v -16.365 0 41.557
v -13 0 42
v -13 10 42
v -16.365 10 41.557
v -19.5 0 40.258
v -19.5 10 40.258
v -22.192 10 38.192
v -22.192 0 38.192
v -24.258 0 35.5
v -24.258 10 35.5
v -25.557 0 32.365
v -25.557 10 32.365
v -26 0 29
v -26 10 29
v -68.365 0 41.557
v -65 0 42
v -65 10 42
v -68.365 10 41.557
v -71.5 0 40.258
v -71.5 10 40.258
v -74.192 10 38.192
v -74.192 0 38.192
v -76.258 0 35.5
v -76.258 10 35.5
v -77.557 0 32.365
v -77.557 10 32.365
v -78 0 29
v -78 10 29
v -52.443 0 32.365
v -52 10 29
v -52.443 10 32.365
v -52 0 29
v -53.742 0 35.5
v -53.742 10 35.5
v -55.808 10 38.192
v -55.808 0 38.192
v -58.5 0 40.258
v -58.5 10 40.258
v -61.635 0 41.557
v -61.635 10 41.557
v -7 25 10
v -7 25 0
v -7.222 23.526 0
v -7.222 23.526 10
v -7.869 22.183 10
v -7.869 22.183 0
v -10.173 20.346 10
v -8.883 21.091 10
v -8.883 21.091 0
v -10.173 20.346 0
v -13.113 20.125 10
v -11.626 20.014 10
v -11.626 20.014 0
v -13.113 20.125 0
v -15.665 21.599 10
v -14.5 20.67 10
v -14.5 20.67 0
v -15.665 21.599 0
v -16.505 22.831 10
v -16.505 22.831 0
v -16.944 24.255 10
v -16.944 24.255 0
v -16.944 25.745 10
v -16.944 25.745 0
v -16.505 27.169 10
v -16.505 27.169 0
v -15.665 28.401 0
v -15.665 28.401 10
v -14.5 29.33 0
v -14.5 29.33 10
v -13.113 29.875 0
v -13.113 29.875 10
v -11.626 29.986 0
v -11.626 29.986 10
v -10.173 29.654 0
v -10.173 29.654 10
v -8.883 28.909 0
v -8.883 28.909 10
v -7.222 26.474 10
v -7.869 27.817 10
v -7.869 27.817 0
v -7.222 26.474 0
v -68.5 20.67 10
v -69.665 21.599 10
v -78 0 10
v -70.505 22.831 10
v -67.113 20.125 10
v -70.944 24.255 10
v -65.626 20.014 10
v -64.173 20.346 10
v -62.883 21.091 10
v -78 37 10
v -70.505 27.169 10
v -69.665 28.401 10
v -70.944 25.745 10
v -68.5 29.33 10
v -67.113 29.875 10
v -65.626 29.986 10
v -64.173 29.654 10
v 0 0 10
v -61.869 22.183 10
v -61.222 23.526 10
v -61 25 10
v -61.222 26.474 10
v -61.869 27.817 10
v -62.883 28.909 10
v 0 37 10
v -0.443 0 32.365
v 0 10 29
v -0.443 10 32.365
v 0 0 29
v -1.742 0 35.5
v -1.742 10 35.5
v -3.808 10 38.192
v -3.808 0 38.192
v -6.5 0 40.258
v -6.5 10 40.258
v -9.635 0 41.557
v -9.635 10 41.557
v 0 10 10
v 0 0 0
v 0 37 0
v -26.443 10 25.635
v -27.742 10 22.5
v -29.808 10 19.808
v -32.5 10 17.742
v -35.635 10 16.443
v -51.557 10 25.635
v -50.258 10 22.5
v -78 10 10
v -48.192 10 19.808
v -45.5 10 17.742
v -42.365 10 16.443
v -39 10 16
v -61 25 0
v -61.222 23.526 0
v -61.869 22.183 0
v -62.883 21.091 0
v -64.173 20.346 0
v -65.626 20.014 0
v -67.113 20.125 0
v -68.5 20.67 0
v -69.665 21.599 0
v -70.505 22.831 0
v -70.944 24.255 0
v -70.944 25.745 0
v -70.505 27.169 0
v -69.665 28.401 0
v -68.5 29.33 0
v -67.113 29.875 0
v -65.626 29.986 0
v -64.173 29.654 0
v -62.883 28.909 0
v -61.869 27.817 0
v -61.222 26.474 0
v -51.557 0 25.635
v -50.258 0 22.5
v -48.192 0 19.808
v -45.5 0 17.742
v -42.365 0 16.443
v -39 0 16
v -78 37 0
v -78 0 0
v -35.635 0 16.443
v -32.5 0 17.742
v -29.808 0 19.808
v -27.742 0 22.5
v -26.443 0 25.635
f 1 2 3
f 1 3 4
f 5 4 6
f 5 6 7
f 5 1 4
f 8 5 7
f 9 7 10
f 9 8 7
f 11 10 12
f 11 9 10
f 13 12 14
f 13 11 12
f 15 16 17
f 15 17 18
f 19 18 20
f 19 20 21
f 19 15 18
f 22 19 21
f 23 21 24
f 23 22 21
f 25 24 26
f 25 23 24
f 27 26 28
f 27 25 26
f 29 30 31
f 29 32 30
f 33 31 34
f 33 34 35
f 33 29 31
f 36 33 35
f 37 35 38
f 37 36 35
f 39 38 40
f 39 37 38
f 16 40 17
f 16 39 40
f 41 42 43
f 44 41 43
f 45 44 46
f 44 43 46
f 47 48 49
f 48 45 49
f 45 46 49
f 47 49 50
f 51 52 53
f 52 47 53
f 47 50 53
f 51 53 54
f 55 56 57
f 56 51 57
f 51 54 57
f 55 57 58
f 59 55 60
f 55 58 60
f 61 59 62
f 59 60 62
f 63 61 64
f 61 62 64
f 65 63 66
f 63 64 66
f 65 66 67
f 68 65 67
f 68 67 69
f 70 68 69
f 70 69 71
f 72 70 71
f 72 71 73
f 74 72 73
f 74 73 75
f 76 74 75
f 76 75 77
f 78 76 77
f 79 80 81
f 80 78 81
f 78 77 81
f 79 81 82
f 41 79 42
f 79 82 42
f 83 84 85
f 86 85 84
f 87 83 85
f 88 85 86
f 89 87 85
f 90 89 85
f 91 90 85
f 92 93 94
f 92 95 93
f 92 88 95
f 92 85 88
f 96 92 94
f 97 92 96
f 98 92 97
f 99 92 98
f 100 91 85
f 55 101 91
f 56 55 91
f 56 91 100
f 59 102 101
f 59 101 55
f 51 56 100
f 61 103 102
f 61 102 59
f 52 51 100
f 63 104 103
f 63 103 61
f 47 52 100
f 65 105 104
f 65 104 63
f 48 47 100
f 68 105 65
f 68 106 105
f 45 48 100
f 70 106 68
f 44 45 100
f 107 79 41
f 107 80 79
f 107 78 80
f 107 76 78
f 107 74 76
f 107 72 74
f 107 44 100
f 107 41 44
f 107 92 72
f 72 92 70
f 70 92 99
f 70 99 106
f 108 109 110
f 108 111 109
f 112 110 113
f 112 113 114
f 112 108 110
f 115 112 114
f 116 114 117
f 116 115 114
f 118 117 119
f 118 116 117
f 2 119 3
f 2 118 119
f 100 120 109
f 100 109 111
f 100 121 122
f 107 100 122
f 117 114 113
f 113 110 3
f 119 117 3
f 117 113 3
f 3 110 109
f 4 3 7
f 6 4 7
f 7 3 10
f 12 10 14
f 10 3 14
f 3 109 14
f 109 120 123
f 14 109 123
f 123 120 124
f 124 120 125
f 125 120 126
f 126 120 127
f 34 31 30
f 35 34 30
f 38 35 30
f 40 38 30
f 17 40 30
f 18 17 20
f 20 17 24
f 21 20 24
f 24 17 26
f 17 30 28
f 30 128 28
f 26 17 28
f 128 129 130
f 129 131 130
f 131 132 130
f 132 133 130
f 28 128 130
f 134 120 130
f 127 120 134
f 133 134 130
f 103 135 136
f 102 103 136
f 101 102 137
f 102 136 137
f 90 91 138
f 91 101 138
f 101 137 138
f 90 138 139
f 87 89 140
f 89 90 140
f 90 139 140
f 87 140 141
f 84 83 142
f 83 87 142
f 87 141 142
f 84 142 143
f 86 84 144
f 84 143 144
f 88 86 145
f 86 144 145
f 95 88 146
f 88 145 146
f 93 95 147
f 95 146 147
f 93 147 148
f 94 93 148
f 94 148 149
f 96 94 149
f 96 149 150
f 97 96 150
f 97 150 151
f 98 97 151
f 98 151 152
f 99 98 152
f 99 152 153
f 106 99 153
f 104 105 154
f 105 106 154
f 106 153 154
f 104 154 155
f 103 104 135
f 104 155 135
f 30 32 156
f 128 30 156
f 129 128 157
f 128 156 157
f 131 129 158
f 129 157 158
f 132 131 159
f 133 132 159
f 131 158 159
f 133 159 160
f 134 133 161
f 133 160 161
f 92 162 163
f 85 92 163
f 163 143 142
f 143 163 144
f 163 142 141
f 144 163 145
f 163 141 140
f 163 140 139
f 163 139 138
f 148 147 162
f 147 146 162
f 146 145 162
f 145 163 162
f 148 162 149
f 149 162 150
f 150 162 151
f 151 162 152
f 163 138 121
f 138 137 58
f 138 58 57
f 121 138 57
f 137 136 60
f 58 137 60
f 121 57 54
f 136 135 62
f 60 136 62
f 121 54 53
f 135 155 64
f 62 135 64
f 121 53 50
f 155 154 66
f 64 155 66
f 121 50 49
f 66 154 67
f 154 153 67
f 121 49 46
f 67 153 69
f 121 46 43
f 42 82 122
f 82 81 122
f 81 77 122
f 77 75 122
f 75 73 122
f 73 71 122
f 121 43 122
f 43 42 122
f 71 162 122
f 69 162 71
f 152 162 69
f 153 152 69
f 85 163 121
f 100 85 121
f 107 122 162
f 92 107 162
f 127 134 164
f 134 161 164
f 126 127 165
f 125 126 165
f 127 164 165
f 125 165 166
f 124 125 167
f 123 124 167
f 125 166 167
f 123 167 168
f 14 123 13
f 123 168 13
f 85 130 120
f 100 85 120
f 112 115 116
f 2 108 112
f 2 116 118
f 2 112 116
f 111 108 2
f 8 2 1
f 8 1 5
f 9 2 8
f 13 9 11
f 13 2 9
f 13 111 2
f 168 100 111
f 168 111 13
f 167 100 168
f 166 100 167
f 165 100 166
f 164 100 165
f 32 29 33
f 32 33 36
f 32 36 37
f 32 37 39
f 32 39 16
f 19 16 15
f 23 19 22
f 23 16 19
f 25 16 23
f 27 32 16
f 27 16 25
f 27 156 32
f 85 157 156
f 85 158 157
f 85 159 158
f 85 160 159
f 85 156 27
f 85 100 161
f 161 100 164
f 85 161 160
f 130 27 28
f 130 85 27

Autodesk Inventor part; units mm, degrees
ref_plane "YZ Plane" through (0, 0, 0) normal (1, 0, 0) x (0, 1, 0)
ref_plane "XZ Plane" through (0, 0, 0) normal (0, 1, 0) x (-1, 0, 0)
ref_plane "XY Plane" through (0, 0, 0) normal (0, 0, 1) x (1, 0, 0)
sketch "Sketch1" plane through (0, 0, 0) normal (0, 0, 1) x (1, 0, 0)
  line L0 (0, 37) -> (-78, 37)
  line L1 (-78, 37) -> (-78, 0)
  line L2 (-78, 0) -> (0, 0)
  line L3 (0, 0) -> (0, 37)
  circle A0 centre (-12, 25) radius 5
  circle A1 centre (-66, 25) radius 5
  point P0 (-39, 0)
  dimension "d0" = 78
  dimension "d1" = 37
  dimension "d2" = 10
  dimension "d3" = 12
  dimension "d4" = 12
  dimension "d5" = 12
  dimension "d6" = 12
extrude "Extrusion1" add sketch "Sketch1" along normal blind 10
sketch "Sketch2" plane through (0, 0, 10) normal (0, 0, 1) x (1, 0, 0)
  line L0 (0, 37) -> (0, 0) projected
  line L1 (-78, 0) -> (-78, 37) projected
  line L2 (0, 0) -> (-78, 0) projected
  line L3 (0, 10) -> (-78, 10)
  dimension "d9" = 10
extrude "Extrusion2" add sketch "Sketch2" along normal blind 60 separate body
sketch "Sketch4" plane through (-78, 10, 10) normal (0, 1, 0) x (1, 0, 0)
  line L0 (0, -60) -> (78, -60) projected
  line L1 (78, 0) -> (78, -60) projected
  line L2 (0, 0) -> (0, -60) projected
  line L3 (78, -32) -> (52, -32)
  line L4 (52, -32) -> (52, -6)
  line L5 (52, -6) -> (26, -6)
  line L6 (26, -6) -> (26, -32)
  line L7 (26, -32) -> (0, -32)
  point P0 (78, 10)
  dimension "d12" = 6
  dimension "d13" = 26
extrude "Extrusion4" cut sketch "Sketch4" against normal through all bodies 2
full round fillet "Fillet4" bodies 2 first side at (0, 6.6667, 31.3333) centre faces at (-8.6667, 6.6667, 42) second side at (-26, 6.6667, 33.3333)
full round fillet "Fillet5" bodies 2 first side at (-52, 6.6667, 24.6667) centre faces at (-60.6667, 3.3333, 42) second side at (-78, 3.3333, 31.3333)
full round fillet "Fillet6" bodies 2 first side at (-52, 6.6667, 20.3334) centre faces at (-34.6667, 3.3333, 16) second side at (-26, 3.3333, 24.6667)
properties part number "Guide Bracket"
